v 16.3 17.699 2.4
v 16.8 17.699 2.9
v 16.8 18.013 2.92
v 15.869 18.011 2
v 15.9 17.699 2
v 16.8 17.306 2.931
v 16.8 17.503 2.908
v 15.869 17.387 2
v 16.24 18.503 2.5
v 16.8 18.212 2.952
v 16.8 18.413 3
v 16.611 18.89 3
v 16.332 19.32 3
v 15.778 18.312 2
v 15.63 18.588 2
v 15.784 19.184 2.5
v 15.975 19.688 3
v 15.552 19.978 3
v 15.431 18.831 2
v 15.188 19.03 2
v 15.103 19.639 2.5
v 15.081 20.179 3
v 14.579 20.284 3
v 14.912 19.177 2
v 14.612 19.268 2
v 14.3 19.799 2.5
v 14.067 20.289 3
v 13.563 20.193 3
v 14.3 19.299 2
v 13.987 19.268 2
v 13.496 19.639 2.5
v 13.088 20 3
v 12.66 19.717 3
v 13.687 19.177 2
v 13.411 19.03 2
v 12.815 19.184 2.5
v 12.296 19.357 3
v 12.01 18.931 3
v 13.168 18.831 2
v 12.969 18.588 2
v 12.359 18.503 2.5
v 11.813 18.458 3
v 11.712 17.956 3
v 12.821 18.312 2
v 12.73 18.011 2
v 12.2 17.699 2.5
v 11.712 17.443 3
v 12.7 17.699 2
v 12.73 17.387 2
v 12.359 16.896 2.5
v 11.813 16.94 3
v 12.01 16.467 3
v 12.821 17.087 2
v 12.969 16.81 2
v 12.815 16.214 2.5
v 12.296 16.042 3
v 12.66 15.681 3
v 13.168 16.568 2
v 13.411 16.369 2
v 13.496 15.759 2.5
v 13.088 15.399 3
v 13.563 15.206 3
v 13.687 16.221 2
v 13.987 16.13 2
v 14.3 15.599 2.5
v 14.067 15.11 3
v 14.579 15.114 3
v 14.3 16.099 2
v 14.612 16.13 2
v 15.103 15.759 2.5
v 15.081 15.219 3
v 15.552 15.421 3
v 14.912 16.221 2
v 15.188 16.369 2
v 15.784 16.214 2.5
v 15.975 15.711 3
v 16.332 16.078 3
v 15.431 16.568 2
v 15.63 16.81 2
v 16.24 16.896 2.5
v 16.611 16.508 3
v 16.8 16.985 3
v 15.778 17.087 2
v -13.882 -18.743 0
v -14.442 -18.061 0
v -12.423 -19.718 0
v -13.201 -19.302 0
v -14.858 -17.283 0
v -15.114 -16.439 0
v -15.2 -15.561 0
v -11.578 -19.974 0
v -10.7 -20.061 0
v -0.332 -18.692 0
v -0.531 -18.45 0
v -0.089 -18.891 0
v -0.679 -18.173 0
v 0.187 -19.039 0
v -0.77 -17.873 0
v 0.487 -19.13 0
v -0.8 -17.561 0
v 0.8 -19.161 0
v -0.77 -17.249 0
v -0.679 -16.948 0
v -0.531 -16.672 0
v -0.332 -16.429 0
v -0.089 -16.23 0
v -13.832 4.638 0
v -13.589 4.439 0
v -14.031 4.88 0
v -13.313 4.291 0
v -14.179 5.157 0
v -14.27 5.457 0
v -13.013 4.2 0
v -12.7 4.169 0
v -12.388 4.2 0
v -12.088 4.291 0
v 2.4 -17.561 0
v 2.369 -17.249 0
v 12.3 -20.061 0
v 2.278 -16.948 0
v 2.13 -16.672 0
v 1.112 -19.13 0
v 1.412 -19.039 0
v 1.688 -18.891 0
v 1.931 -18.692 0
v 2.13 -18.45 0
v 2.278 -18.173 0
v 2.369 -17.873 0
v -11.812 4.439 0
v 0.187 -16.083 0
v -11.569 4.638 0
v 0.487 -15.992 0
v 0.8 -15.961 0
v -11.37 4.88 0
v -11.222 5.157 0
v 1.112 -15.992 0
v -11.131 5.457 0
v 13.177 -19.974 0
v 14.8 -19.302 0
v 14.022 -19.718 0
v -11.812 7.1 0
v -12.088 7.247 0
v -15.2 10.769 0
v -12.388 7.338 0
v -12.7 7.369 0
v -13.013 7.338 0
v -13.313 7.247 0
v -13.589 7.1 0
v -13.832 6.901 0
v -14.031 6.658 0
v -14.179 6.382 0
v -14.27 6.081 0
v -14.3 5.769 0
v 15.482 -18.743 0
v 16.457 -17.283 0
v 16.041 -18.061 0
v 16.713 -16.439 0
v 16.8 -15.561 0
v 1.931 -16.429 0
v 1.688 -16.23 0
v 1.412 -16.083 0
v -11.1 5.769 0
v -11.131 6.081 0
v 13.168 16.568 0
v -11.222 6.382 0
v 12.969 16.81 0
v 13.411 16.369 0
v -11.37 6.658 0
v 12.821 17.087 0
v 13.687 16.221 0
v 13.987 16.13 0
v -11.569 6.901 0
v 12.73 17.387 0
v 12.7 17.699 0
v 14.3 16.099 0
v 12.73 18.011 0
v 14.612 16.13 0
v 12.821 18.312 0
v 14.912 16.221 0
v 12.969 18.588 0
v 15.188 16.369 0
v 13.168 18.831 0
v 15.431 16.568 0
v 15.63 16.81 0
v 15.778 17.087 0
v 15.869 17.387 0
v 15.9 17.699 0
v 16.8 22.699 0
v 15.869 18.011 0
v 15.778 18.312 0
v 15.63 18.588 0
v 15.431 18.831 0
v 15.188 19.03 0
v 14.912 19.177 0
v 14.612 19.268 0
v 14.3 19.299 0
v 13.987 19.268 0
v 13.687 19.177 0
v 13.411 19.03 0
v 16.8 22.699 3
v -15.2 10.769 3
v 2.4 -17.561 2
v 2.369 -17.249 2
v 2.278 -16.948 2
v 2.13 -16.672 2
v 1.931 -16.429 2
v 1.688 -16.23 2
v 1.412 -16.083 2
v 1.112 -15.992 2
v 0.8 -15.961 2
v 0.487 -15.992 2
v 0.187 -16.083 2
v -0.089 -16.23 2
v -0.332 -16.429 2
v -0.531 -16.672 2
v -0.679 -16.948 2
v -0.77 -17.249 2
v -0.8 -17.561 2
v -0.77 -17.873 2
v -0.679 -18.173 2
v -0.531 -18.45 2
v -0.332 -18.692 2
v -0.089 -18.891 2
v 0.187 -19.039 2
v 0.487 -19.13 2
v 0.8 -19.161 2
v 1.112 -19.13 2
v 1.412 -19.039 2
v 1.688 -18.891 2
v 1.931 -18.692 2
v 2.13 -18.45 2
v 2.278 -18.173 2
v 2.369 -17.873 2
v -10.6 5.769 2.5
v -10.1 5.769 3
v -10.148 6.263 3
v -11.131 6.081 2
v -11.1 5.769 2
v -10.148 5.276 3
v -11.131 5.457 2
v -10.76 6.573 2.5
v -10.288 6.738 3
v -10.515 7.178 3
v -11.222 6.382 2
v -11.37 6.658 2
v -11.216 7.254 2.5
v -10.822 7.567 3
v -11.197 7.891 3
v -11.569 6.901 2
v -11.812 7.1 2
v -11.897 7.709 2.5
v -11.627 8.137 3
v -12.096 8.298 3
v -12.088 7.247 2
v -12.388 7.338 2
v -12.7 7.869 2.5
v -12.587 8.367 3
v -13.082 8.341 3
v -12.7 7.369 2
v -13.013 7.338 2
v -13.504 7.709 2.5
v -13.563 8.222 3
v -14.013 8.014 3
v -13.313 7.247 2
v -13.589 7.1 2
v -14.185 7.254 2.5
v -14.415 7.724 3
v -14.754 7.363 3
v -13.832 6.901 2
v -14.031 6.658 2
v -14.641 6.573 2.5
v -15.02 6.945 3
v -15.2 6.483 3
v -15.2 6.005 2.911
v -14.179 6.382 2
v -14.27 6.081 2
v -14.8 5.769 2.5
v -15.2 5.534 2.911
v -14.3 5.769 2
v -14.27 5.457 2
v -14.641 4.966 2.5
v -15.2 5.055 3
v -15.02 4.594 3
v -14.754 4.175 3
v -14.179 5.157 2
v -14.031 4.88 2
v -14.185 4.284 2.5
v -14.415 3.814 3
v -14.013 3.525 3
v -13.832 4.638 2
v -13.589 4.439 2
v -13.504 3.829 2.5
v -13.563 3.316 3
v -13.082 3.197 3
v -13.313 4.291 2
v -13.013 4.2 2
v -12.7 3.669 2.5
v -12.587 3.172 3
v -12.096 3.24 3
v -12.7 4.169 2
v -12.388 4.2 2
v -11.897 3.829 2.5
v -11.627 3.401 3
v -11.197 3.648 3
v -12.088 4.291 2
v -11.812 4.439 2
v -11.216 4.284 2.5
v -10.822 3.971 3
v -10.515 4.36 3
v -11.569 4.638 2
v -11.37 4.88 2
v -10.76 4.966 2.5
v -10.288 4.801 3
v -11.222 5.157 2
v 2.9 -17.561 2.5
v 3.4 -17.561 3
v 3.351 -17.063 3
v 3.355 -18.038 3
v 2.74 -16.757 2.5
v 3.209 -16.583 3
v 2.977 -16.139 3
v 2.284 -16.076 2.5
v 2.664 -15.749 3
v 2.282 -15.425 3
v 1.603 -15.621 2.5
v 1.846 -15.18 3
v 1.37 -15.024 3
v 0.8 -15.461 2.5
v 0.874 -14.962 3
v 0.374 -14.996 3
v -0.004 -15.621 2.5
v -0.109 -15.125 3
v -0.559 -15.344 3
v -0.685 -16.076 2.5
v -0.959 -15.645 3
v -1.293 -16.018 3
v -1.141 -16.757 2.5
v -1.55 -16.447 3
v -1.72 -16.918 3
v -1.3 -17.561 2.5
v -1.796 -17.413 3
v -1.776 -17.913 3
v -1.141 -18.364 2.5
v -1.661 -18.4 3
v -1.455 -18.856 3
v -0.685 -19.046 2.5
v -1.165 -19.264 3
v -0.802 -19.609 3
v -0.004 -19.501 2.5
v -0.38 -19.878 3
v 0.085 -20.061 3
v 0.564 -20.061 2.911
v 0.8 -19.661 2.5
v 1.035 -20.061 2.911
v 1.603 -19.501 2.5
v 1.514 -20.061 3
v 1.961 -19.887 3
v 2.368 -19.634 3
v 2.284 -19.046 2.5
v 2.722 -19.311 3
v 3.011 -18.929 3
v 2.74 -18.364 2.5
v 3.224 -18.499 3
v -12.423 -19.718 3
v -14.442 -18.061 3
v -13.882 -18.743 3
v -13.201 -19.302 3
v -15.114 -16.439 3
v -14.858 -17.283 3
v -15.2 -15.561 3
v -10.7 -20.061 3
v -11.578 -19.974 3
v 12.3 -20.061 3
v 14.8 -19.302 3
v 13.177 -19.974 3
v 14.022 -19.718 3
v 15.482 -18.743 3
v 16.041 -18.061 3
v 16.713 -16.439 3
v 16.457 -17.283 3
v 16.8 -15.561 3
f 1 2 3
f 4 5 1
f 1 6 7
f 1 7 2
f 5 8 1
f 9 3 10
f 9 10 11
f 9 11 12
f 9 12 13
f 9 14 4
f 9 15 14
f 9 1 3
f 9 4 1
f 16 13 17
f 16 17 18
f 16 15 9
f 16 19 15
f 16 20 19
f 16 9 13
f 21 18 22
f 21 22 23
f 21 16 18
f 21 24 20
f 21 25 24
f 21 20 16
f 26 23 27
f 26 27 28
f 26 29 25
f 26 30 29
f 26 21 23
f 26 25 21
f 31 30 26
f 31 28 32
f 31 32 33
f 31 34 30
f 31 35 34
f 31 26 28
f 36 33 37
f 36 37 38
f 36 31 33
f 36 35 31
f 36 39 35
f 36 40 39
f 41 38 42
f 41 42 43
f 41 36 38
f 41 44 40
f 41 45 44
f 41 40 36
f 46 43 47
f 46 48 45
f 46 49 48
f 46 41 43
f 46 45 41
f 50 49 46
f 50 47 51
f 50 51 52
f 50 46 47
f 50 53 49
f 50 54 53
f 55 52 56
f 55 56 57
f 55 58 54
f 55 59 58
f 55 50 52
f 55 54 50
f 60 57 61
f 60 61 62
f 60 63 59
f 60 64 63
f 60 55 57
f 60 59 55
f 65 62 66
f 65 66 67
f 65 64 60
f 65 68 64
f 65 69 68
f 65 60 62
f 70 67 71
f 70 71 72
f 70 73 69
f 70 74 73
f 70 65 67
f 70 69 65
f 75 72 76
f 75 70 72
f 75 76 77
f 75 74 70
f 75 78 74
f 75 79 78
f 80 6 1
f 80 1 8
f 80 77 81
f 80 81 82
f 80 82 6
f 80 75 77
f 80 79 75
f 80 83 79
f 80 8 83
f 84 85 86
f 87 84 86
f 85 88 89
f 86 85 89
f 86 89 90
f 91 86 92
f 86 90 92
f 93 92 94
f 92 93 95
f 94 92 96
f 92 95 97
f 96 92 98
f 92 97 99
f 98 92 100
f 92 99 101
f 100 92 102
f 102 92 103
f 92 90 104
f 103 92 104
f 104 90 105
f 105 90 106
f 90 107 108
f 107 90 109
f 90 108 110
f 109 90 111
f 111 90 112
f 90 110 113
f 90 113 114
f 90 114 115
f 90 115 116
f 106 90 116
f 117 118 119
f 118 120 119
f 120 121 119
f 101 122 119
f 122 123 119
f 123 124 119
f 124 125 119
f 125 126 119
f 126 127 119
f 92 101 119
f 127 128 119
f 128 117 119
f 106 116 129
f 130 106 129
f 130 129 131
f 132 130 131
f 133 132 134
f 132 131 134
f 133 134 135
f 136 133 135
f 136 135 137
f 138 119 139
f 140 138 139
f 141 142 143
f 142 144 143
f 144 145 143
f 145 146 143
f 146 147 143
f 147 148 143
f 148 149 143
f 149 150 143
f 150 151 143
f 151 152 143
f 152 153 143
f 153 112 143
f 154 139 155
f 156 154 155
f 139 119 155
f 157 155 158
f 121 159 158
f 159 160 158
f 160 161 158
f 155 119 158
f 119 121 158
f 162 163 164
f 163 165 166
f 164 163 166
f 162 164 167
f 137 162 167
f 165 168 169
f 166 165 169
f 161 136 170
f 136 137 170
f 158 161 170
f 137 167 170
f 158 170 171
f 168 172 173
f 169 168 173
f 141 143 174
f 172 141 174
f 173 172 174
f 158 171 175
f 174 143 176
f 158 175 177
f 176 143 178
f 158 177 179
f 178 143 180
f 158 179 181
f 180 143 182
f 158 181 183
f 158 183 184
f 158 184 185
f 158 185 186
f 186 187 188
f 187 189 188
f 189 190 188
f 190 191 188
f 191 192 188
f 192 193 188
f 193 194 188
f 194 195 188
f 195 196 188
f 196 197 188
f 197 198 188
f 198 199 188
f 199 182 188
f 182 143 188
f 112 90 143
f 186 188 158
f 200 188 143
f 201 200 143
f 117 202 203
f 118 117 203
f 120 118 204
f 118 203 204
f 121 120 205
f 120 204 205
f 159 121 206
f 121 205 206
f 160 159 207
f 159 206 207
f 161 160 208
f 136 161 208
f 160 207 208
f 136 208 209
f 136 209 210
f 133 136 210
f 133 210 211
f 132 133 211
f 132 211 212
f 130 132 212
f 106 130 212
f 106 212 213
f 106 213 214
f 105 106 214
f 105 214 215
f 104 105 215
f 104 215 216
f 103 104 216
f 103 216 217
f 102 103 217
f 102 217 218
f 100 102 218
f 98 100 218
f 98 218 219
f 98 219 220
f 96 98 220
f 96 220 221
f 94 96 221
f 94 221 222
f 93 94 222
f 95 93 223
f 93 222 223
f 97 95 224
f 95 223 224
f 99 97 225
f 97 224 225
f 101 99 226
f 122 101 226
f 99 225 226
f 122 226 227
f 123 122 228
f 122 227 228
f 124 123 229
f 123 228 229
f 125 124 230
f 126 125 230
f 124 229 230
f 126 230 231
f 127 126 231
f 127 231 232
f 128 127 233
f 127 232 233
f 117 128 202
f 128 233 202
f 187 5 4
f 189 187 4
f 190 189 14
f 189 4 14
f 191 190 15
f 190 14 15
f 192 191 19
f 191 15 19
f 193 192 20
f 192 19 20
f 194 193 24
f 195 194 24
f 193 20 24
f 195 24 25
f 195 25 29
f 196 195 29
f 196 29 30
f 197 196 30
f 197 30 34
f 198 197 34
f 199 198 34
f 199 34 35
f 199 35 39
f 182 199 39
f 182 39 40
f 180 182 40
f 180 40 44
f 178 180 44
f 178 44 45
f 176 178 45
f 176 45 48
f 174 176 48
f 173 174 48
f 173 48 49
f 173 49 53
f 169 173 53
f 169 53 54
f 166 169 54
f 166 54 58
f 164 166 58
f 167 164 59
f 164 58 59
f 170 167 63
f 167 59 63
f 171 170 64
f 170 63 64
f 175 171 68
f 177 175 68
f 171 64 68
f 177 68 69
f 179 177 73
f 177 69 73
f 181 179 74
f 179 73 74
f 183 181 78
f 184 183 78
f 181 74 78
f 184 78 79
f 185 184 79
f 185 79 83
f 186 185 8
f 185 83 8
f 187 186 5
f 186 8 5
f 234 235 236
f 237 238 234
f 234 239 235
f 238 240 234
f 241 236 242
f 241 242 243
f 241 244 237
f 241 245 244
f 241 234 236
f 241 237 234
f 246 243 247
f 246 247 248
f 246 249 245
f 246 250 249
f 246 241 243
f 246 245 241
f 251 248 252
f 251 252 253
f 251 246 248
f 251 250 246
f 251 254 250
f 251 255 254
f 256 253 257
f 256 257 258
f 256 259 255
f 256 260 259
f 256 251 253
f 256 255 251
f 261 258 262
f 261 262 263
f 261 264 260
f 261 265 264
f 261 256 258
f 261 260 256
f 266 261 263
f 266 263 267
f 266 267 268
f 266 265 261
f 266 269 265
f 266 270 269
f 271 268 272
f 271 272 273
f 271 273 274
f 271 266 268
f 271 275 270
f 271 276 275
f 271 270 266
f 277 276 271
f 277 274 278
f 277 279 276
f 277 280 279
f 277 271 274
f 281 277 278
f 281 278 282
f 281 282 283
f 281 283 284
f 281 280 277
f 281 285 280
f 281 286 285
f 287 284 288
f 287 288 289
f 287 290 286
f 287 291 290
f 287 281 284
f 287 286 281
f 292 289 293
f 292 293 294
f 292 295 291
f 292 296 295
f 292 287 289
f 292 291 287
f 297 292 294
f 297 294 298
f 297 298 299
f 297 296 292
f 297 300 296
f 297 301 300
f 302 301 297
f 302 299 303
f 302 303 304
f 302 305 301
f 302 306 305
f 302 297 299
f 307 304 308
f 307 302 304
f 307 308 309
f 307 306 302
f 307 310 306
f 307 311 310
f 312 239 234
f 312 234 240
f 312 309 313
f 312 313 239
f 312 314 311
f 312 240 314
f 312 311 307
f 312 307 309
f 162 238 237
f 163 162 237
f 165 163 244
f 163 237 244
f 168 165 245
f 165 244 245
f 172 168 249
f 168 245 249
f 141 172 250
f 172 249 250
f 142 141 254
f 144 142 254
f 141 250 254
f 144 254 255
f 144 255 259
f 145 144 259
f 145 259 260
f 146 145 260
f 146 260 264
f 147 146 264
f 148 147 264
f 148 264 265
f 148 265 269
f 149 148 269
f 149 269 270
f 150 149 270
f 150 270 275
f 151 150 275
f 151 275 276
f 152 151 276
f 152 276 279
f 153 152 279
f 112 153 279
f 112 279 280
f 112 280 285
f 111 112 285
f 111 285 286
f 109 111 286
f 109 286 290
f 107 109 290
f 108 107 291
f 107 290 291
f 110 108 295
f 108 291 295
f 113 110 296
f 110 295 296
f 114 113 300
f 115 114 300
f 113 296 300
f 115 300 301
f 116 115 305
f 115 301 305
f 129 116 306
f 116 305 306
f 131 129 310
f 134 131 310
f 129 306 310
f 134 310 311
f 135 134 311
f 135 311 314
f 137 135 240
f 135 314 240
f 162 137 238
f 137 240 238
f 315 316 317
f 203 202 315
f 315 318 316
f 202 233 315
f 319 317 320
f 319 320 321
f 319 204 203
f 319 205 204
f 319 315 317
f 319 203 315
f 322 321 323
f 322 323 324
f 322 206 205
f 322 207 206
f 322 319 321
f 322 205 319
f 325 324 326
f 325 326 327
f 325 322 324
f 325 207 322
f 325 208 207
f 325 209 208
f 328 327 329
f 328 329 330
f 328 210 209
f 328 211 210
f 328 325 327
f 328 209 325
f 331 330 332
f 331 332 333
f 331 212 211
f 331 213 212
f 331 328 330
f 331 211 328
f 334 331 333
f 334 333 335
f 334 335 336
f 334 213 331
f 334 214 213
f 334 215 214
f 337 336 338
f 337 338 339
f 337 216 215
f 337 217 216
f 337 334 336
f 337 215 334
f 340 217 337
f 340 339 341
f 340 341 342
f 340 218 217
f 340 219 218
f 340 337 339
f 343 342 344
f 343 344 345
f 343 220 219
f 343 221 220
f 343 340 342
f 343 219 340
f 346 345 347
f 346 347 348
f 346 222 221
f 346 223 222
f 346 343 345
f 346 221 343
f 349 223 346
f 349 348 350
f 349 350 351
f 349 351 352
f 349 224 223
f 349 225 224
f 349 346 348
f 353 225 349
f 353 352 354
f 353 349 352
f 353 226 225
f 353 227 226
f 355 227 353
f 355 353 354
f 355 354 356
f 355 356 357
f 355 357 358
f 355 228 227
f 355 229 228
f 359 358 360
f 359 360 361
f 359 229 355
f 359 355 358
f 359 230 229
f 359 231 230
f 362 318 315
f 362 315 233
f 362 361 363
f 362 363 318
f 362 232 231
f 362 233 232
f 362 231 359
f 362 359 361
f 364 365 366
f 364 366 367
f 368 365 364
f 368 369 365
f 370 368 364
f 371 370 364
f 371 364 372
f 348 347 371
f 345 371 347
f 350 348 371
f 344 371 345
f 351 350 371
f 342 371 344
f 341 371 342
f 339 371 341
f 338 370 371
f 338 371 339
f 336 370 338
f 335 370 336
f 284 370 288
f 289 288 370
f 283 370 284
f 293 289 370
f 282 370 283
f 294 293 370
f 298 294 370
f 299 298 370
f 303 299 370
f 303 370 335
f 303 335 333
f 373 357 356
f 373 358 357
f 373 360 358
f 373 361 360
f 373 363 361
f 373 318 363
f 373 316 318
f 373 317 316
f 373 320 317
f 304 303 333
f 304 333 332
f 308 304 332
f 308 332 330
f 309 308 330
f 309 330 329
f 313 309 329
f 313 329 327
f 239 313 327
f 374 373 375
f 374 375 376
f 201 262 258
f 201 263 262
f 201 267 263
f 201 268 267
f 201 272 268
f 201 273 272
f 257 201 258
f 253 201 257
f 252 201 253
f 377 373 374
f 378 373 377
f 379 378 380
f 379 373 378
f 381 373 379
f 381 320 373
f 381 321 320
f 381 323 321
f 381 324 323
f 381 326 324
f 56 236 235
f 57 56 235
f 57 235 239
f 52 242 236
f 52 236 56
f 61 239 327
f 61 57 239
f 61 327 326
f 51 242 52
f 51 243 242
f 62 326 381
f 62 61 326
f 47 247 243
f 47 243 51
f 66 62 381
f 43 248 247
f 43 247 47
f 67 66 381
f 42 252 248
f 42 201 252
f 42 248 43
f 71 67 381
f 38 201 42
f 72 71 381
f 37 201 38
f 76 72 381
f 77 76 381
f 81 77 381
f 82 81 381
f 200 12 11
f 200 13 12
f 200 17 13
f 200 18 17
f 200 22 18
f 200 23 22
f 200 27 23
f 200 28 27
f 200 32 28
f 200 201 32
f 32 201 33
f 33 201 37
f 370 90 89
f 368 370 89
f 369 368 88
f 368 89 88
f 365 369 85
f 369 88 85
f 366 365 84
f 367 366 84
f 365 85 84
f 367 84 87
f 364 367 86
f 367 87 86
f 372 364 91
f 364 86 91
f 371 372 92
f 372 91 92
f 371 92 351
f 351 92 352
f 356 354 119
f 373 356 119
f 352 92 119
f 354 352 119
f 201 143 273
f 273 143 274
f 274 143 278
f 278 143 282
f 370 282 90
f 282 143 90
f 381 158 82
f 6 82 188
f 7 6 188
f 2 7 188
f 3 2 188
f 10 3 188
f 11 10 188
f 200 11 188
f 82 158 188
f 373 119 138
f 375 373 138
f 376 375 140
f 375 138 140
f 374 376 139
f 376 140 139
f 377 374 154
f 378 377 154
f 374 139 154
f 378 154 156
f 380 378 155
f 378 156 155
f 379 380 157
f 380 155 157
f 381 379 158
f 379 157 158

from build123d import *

# Parameters (mm, degrees)
DODANIE_WYCI_GNI_CIE1_DEPTH = 3
SZKIC2_R                    = 1.6
WYTNIJ_WYCI_GNI_CIE1_DEPTH  = 3
SFAZOWANIE1_SIZE            = 1


with BuildPart() as part:
    # Szkic1 → Dodanie-wyciągnięcie1 (new body)
    with BuildSketch(Plane.XY):
        with BuildLine():
            Line((16.79955852, 22.699230769), (-15.20044148, 10.769230769))
            Line((-15.20044148, 10.769230769), (-15.20044148, -15.560769231))
            ThreePointArc((-15.20044148, -15.560769231), (-13.882421995, -18.742749746), (-10.70044148, -20.060769231))
            Line((-10.70044148, -20.060769231), (12.29955852, -20.060769231))
            ThreePointArc((12.29955852, -20.060769231), (15.481539035, -18.742749746), (16.79955852, -15.560769231))
            Line((16.79955852, -15.560769231), (16.79955852, 22.699230769))
        make_face()
    extrude(amount=DODANIE_WYCI_GNI_CIE1_DEPTH)

    # Szkic2 → Wytnij-wyciągnięcie1 (cut)
    with BuildSketch(Plane.XY.offset(3)):
        with Locations((-12.70044148, 5.769230769)):
            Circle(SZKIC2_R)
        with Locations((14.29955852, 17.699230769)):
            Circle(SZKIC2_R)
        with Locations((0.79955852, -17.560769231)):
            Circle(SZKIC2_R)
    extrude(amount=-WYTNIJ_WYCI_GNI_CIE1_DEPTH, mode=Mode.SUBTRACT)

    # Sfazowanie1
    # the kernel refuses this chamfer: 1 mm, written as the material it takes off along each edge
    with BuildSketch(Plane(origin=(-12.70044148, 5.769230769, 3), x_dir=(1, 0, 0), z_dir=(0, -1, 0))) as sfazowanie1_piece_1:
        Polygon((1.6 + SFAZOWANIE1_SIZE, 0), (1.6, -SFAZOWANIE1_SIZE), (1.6, 0), align=None)
    revolve(axis=Axis((-12.70044148, 5.769230769, 3), (0, 0, 1)), mode=Mode.SUBTRACT)
    with BuildSketch(Plane(origin=(14.29955852, 17.699230769, 3), x_dir=(1, 0, 0), z_dir=(0, -1, 0))) as sfazowanie1_piece_2:
        Polygon((1.6 + SFAZOWANIE1_SIZE, 0), (1.6, -SFAZOWANIE1_SIZE), (1.6, 0), align=None)
    revolve(axis=Axis((14.29955852, 17.699230769, 3), (0, 0, 1)), mode=Mode.SUBTRACT)
    with BuildSketch(Plane(origin=(0.79955852, -17.560769231, 3), x_dir=(1, 0, 0), z_dir=(0, -1, 0))) as sfazowanie1_piece_3:
        Polygon((1.6 + SFAZOWANIE1_SIZE, 0), (1.6, -SFAZOWANIE1_SIZE), (1.6, 0), align=None)
    revolve(axis=Axis((0.79955852, -17.560769231, 3), (0, 0, 1)), mode=Mode.SUBTRACT)


solid = part.part
